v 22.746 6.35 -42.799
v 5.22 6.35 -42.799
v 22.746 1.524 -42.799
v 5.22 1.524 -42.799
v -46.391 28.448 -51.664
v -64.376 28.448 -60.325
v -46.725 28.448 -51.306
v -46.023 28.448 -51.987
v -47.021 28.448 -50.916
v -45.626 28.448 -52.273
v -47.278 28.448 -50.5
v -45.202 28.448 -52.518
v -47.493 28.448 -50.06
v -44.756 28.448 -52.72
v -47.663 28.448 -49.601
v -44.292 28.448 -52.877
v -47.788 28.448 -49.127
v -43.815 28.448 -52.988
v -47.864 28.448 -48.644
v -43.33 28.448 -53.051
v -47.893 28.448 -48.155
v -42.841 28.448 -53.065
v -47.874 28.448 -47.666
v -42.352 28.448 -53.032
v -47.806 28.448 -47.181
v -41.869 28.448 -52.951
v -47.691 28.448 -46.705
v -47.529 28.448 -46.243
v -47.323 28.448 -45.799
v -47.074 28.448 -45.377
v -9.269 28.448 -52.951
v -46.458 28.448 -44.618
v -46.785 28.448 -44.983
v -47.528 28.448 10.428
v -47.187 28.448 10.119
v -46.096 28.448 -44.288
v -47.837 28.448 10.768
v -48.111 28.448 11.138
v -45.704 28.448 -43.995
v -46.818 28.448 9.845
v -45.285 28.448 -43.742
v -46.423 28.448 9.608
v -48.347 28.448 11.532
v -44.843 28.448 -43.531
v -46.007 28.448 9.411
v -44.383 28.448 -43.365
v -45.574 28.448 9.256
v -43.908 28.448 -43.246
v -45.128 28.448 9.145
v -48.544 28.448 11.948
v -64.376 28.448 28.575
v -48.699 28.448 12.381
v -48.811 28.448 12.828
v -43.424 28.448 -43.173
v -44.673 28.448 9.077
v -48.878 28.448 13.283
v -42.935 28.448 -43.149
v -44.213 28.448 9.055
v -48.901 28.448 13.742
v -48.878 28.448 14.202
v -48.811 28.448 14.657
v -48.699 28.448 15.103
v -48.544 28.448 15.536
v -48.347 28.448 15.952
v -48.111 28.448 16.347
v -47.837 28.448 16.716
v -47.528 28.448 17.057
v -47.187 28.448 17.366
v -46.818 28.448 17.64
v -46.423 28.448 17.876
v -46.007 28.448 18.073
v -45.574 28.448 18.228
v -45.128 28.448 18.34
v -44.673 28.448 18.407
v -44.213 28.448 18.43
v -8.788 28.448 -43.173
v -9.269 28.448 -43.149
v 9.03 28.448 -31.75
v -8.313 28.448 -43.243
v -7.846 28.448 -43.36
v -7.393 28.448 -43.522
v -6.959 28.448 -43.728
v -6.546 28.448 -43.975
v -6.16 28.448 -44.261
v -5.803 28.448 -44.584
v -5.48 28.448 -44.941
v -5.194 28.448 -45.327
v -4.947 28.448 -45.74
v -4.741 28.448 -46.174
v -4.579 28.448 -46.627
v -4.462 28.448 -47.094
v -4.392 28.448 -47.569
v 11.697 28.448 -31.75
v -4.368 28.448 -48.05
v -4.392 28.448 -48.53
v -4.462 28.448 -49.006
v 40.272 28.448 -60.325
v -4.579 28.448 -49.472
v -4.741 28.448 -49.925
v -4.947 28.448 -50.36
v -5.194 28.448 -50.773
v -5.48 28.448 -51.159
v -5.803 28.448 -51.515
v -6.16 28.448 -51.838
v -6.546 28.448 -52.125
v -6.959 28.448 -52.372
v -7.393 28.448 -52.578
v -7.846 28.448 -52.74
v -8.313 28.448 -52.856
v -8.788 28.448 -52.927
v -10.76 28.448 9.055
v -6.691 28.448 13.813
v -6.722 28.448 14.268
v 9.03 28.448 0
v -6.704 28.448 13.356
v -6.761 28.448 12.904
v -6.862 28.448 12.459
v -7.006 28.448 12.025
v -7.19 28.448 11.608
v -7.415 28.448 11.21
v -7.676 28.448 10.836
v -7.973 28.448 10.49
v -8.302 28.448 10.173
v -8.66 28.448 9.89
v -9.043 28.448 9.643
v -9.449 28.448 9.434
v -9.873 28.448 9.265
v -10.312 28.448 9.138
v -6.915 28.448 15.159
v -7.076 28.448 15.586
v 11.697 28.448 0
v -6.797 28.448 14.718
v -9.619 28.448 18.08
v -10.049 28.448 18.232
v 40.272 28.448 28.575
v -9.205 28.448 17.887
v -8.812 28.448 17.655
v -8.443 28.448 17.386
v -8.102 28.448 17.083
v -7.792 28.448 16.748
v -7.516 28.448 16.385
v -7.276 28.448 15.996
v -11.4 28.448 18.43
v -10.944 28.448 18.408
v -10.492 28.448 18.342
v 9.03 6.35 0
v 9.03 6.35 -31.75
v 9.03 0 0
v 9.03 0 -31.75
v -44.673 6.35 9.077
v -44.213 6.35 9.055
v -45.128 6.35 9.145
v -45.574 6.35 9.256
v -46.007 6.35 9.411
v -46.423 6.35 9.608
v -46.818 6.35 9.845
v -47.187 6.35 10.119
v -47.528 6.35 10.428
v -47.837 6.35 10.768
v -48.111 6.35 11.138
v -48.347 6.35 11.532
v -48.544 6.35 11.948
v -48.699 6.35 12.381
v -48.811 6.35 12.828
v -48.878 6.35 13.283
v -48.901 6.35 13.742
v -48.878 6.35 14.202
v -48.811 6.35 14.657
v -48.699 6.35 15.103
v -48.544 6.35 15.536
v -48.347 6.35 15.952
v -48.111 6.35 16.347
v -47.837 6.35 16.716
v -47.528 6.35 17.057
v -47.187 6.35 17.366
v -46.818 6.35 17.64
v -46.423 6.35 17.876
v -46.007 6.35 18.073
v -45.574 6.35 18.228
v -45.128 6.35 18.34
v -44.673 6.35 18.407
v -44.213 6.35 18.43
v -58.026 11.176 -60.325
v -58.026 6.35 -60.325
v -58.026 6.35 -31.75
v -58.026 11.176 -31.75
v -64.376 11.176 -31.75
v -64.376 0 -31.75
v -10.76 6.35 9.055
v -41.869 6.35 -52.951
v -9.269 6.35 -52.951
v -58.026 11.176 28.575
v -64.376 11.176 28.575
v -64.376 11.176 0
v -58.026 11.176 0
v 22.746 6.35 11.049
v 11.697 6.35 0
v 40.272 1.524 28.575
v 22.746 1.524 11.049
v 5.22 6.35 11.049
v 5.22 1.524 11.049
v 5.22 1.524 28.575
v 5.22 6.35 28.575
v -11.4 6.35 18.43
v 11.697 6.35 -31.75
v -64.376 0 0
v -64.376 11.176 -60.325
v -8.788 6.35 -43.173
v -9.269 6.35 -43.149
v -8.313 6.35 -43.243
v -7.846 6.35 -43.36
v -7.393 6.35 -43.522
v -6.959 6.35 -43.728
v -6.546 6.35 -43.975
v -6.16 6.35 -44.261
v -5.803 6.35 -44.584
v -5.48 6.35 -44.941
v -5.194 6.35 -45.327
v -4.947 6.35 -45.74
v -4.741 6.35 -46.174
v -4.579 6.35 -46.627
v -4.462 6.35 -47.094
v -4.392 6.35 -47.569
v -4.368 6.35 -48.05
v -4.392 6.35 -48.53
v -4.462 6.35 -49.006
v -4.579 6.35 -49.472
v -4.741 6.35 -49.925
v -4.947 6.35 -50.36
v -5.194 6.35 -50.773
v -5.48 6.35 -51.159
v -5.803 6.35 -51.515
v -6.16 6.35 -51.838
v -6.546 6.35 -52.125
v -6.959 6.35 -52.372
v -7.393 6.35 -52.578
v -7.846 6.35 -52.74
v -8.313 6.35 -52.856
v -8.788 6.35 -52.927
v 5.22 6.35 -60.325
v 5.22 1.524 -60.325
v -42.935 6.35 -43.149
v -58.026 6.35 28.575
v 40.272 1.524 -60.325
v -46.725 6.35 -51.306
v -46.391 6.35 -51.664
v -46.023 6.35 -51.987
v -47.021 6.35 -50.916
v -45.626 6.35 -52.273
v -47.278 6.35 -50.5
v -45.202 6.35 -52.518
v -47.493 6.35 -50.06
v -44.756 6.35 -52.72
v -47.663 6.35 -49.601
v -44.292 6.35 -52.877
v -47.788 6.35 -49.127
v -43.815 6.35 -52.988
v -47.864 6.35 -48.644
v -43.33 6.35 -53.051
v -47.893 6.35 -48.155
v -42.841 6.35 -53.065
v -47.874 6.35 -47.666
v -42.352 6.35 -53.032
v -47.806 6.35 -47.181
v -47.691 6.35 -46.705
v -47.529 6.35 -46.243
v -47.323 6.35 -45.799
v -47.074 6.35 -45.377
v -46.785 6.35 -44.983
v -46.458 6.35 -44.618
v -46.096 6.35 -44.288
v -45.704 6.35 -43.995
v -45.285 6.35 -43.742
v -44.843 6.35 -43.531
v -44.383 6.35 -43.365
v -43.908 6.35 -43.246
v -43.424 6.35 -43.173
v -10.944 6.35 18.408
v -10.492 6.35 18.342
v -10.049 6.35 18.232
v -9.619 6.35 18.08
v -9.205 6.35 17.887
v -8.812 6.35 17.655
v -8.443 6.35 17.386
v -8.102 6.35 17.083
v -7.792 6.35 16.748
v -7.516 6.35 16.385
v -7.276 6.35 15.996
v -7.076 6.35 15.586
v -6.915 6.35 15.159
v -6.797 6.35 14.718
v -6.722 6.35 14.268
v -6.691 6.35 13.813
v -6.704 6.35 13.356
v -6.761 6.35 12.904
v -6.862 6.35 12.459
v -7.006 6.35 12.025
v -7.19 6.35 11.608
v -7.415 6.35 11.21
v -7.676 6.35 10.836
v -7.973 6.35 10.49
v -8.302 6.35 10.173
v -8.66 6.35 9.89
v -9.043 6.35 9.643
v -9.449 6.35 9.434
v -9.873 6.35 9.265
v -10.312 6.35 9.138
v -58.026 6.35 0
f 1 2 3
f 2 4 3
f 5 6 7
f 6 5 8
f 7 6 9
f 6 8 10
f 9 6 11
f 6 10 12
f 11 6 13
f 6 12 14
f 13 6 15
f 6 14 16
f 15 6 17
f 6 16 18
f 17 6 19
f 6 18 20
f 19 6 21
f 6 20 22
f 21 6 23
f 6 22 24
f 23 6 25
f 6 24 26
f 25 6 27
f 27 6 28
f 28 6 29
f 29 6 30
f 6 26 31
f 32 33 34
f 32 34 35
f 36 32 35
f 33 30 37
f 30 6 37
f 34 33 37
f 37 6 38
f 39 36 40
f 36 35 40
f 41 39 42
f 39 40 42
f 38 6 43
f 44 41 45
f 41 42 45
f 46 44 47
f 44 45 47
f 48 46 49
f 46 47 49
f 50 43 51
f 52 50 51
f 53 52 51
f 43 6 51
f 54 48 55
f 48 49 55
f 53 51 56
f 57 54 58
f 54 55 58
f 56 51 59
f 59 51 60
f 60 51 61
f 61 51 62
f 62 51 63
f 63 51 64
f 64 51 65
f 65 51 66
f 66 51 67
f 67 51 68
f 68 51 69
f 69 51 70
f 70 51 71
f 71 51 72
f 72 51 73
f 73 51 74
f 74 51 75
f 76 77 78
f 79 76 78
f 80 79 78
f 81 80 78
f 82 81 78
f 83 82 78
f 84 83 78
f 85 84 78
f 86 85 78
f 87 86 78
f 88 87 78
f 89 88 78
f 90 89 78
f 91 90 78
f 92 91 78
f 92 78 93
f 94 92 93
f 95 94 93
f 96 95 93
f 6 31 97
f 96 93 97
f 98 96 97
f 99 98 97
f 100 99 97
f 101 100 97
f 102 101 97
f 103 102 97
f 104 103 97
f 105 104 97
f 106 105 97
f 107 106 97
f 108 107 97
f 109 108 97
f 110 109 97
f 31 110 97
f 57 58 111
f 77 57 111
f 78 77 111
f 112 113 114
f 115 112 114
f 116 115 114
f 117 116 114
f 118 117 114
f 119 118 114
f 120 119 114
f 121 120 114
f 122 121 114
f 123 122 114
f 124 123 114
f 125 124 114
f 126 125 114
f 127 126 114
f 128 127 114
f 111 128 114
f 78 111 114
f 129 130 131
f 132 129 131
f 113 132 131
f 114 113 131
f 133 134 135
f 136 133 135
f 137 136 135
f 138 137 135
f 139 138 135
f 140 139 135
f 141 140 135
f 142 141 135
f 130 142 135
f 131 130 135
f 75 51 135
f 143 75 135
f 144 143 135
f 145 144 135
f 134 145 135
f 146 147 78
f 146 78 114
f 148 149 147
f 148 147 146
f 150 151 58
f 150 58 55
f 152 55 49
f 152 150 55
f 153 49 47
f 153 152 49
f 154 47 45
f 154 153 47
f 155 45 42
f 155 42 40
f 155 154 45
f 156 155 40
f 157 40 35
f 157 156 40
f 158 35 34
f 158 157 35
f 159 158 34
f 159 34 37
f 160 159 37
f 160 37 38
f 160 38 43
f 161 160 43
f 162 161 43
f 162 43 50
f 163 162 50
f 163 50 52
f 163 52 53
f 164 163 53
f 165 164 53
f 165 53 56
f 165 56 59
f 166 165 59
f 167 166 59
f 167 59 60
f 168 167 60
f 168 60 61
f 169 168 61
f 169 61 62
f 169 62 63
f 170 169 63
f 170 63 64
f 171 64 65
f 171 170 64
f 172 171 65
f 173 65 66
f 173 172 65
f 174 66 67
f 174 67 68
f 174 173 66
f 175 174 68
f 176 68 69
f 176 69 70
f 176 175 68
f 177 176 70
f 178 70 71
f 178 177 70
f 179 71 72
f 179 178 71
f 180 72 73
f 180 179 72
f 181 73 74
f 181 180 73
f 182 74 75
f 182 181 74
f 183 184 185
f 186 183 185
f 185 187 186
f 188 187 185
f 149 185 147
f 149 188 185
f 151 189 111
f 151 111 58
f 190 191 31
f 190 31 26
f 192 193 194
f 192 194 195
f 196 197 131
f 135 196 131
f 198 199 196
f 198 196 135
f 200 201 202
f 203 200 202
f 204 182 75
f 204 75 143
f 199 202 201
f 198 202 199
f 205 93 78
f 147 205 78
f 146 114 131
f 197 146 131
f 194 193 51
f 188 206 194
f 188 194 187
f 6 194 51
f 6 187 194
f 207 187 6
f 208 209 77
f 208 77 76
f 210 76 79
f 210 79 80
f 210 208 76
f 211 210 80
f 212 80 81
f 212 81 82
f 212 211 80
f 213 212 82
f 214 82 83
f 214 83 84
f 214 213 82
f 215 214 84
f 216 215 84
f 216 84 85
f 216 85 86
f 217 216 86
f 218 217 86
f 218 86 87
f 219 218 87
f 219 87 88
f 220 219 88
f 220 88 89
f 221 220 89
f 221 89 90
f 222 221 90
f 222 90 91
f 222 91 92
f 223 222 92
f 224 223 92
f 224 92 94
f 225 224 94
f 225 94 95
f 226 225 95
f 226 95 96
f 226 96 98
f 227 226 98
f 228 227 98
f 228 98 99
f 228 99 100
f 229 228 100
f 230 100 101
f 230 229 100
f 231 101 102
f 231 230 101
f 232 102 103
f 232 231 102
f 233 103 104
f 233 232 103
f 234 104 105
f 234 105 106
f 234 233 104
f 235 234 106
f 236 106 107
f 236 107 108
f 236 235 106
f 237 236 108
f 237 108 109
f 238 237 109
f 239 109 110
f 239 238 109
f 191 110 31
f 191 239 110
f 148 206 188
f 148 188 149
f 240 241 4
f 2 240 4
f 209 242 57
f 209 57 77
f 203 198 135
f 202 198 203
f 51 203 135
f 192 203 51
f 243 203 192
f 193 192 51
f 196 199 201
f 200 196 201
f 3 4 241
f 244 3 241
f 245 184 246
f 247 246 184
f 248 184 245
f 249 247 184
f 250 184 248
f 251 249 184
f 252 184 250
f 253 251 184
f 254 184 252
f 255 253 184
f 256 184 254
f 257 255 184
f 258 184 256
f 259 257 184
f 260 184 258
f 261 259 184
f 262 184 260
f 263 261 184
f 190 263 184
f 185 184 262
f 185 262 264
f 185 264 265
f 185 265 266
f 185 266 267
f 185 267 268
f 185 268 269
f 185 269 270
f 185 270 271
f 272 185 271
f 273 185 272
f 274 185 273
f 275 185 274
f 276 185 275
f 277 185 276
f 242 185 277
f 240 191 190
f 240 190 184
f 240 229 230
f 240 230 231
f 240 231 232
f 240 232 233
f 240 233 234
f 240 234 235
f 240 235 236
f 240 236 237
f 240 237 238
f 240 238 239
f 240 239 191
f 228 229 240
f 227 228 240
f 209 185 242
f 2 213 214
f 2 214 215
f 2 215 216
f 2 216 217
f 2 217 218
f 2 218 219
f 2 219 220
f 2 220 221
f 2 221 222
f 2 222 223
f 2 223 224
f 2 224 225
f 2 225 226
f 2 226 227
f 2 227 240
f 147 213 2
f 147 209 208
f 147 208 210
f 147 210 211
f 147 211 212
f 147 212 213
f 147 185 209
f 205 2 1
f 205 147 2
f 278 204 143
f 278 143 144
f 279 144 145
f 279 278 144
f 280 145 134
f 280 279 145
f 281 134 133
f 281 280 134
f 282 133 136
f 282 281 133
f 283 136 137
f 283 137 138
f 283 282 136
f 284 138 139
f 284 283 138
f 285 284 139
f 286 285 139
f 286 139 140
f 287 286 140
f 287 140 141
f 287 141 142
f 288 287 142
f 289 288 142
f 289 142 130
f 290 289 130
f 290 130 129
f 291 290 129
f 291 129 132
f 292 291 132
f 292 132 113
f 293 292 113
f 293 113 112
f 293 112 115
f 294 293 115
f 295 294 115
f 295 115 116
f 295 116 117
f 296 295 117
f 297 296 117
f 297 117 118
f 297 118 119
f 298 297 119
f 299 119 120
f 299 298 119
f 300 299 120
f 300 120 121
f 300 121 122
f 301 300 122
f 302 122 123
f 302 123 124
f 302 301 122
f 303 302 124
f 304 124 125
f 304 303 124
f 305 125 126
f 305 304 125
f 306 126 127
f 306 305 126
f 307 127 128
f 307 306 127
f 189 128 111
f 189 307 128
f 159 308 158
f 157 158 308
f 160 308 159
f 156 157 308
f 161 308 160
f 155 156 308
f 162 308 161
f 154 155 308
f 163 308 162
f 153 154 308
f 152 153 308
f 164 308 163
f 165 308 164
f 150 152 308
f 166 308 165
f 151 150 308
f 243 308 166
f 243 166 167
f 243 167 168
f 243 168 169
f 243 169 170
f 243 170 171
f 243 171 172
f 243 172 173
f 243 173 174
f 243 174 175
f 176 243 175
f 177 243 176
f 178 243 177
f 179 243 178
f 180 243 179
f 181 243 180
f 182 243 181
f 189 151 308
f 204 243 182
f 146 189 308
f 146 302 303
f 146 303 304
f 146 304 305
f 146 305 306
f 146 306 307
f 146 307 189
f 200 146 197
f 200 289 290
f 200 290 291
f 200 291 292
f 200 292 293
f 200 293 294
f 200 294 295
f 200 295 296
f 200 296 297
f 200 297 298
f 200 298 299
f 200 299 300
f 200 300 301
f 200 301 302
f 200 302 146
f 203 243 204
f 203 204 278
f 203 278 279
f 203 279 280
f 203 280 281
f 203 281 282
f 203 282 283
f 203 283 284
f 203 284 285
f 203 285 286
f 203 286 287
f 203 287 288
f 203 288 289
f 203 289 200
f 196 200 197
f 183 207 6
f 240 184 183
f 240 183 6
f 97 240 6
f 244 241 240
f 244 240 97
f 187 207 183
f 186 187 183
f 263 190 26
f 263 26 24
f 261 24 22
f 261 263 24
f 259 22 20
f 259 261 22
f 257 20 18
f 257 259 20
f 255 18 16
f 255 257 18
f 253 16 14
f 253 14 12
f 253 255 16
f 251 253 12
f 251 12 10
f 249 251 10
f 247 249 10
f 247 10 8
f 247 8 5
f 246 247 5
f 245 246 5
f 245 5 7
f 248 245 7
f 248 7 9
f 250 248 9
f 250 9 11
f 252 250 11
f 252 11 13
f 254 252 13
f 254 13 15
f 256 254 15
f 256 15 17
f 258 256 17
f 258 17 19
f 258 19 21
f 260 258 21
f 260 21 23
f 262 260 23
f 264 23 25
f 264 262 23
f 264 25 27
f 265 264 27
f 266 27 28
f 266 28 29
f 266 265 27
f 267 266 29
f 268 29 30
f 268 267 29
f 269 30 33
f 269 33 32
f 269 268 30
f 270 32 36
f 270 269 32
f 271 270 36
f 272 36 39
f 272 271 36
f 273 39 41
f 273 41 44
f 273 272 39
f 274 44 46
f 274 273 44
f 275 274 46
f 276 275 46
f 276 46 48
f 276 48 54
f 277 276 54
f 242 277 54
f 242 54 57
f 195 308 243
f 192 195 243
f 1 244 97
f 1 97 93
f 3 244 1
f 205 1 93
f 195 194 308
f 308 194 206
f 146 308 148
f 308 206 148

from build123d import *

# Parameters (mm, degrees)
F0_W     = 6.35
F0_H     = 28.575
F1_DEPTH = 28.448
F2_DEPTH = 6.35
F3_DEPTH = 6.35
F4_DEPTH = 6.35
F5_DEPTH = 5.588
F6_DEPTH = 6.35
F7_DEPTH = 11.176
F8_DEPTH = 1.524


with BuildPart() as f1:
    # F0 (on Front) → F1 (new body)
    with BuildSketch(Plane.XZ):
        with Locations((-61.201207, 14.2875)):
            Rectangle(F0_W, F0_H)
        Polygon((5.219793, 28.575), (-58.026207, 28.575), (-58.026207, 0), (9.029793, 0), (11.696793, 0), (22.745793, 11.049), (5.219793, 11.049), align=None)
        with BuildLine():
            ThreePointArc((-44.21325, 9.054515), (-48.90092, 13.742185), (-44.21325, 18.429855))
            Line((-44.21325, 18.429855), (-11.399561, 18.429855))
            ThreePointArc((-11.399561, 18.429855), (-6.701007, 14.040749), (-10.760333, 9.054515))
            Line((-10.760333, 9.054515), (-44.21325, 9.054515))
        make_face(mode=Mode.SUBTRACT)
        Polygon((-58.026207, 0), (-64.376207, 0), (-64.376207, -31.75), (-58.026207, -31.75), (9.029793, -31.75), (9.029793, 0), align=None)
        Polygon((40.271793, 28.575), (5.219793, 28.575), (5.219793, 11.049), (22.745793, 11.049), align=None)
        with Locations((-61.201207, -46.0375)):
            Rectangle(F0_W, F0_H)
        Polygon((9.029793, -31.75), (-58.026207, -31.75), (-58.026207, -60.325), (5.219793, -60.325), (5.219793, -42.799), (22.745793, -42.799), (11.696793, -31.75), align=None)
        with BuildLine():
            ThreePointArc((-41.869413, -52.950572), (-47.864406, -48.643555), (-42.934794, -43.14908))
            Line((-42.934794, -43.14908), (-9.268802, -43.14908))
            ThreePointArc((-9.268802, -43.14908), (-4.368056, -48.049826), (-9.268802, -52.950572))
            Line((-9.268802, -52.950572), (-41.869413, -52.950572))
        make_face(mode=Mode.SUBTRACT)
        Polygon((5.219793, -42.799), (5.219793, -60.325), (40.271793, -60.325), (22.745793, -42.799), align=None)
    extrude(amount=-F1_DEPTH)

    # F0 (on Front) → F2 (cut)
    with BuildSketch(Plane.XZ):
        Polygon((5.219793, 28.575), (-58.026207, 28.575), (-58.026207, 0), (9.029793, 0), (11.696793, 0), (22.745793, 11.049), (5.219793, 11.049), align=None)
        with BuildLine():
            ThreePointArc((-44.21325, 9.054515), (-48.90092, 13.742185), (-44.21325, 18.429855))
            Line((-44.21325, 18.429855), (-11.399561, 18.429855))
            ThreePointArc((-11.399561, 18.429855), (-6.701007, 14.040749), (-10.760333, 9.054515))
            Line((-10.760333, 9.054515), (-44.21325, 9.054515))
        make_face(mode=Mode.SUBTRACT)
    extrude(amount=F2_DEPTH, mode=Mode.SUBTRACT)

    # F0 (on Front) → F3 (cut)
    with BuildSketch(Plane.XZ):
        Polygon((9.029793, -31.75), (-58.026207, -31.75), (-58.026207, -60.325), (5.219793, -60.325), (5.219793, -42.799), (22.745793, -42.799), (11.696793, -31.75), align=None)
        with BuildLine():
            ThreePointArc((-41.869413, -52.950572), (-47.864406, -48.643555), (-42.934794, -43.14908))
            Line((-42.934794, -43.14908), (-9.268802, -43.14908))
            ThreePointArc((-9.268802, -43.14908), (-4.368056, -48.049826), (-9.268802, -52.950572))
            Line((-9.268802, -52.950572), (-41.869413, -52.950572))
        make_face(mode=Mode.SUBTRACT)
    extrude(amount=F3_DEPTH, mode=Mode.SUBTRACT)

    # F0 (on Front) → F4 (cut)
    with BuildSketch(Plane.XZ):
        Polygon((5.219793, 28.575), (-58.026207, 28.575), (-58.026207, 0), (9.029793, 0), (11.696793, 0), (22.745793, 11.049), (5.219793, 11.049), align=None)
        with BuildLine():
            ThreePointArc((-44.21325, 9.054515), (-48.90092, 13.742185), (-44.21325, 18.429855))
            Line((-44.21325, 18.429855), (-11.399561, 18.429855))
            ThreePointArc((-11.399561, 18.429855), (-6.701007, 14.040749), (-10.760333, 9.054515))
            Line((-10.760333, 9.054515), (-44.21325, 9.054515))
        make_face(mode=Mode.SUBTRACT)
    extrude(amount=-F4_DEPTH, mode=Mode.SUBTRACT)

    # F0 (on Front) → F5 (cut, symmetric)
    with BuildSketch(Plane.XZ):
        Polygon((5.219793, 28.575), (-58.026207, 28.575), (-58.026207, 0), (9.029793, 0), (11.696793, 0), (22.745793, 11.049), (5.219793, 11.049), align=None)
        with BuildLine():
            ThreePointArc((-44.21325, 9.054515), (-48.90092, 13.742185), (-44.21325, 18.429855))
            Line((-44.21325, 18.429855), (-11.399561, 18.429855))
            ThreePointArc((-11.399561, 18.429855), (-6.701007, 14.040749), (-10.760333, 9.054515))
            Line((-10.760333, 9.054515), (-44.21325, 9.054515))
        make_face(mode=Mode.SUBTRACT)
        Polygon((9.029793, -31.75), (-58.026207, -31.75), (-58.026207, -60.325), (5.219793, -60.325), (5.219793, -42.799), (22.745793, -42.799), (11.696793, -31.75), align=None)
        with BuildLine():
            ThreePointArc((-41.869413, -52.950572), (-47.864406, -48.643555), (-42.934794, -43.14908))
            Line((-42.934794, -43.14908), (-9.268802, -43.14908))
            ThreePointArc((-9.268802, -43.14908), (-4.368056, -48.049826), (-9.268802, -52.950572))
            Line((-9.268802, -52.950572), (-41.869413, -52.950572))
        make_face(mode=Mode.SUBTRACT)
    extrude(amount=F5_DEPTH, both=True, mode=Mode.SUBTRACT)

    # F0 (on Front) → F6 (cut)
    with BuildSketch(Plane.XZ):
        Polygon((5.219793, 28.575), (-58.026207, 28.575), (-58.026207, 0), (9.029793, 0), (11.696793, 0), (22.745793, 11.049), (5.219793, 11.049), align=None)
        with BuildLine():
            ThreePointArc((-44.21325, 9.054515), (-48.90092, 13.742185), (-44.21325, 18.429855))
            Line((-44.21325, 18.429855), (-11.399561, 18.429855))
            ThreePointArc((-11.399561, 18.429855), (-6.701007, 14.040749), (-10.760333, 9.054515))
            Line((-10.760333, 9.054515), (-44.21325, 9.054515))
        make_face(mode=Mode.SUBTRACT)
        Polygon((9.029793, -31.75), (-58.026207, -31.75), (-58.026207, -60.325), (5.219793, -60.325), (5.219793, -42.799), (22.745793, -42.799), (11.696793, -31.75), align=None)
        with BuildLine():
            ThreePointArc((-41.869413, -52.950572), (-47.864406, -48.643555), (-42.934794, -43.14908))
            Line((-42.934794, -43.14908), (-9.268802, -43.14908))
            ThreePointArc((-9.268802, -43.14908), (-4.368056, -48.049826), (-9.268802, -52.950572))
            Line((-9.268802, -52.950572), (-41.869413, -52.950572))
        make_face(mode=Mode.SUBTRACT)
    extrude(amount=-F6_DEPTH, mode=Mode.SUBTRACT)

    # F0 (on Front) → F7 (cut)
    with BuildSketch(Plane.XZ):
        with Locations((-61.201207, 14.2875)):
            Rectangle(F0_W, F0_H)
        with Locations((-61.201207, -46.0375)):
            Rectangle(F0_W, F0_H)
    extrude(amount=-F7_DEPTH, mode=Mode.SUBTRACT)

    # F0 (on Front) → F8 (cut)
    with BuildSketch(Plane.XZ):
        Polygon((40.271793, 28.575), (5.219793, 28.575), (5.219793, 11.049), (22.745793, 11.049), align=None)
        Polygon((5.219793, -42.799), (5.219793, -60.325), (40.271793, -60.325), (22.745793, -42.799), align=None)
    extrude(amount=-F8_DEPTH, mode=Mode.SUBTRACT)


solid = f1.part
